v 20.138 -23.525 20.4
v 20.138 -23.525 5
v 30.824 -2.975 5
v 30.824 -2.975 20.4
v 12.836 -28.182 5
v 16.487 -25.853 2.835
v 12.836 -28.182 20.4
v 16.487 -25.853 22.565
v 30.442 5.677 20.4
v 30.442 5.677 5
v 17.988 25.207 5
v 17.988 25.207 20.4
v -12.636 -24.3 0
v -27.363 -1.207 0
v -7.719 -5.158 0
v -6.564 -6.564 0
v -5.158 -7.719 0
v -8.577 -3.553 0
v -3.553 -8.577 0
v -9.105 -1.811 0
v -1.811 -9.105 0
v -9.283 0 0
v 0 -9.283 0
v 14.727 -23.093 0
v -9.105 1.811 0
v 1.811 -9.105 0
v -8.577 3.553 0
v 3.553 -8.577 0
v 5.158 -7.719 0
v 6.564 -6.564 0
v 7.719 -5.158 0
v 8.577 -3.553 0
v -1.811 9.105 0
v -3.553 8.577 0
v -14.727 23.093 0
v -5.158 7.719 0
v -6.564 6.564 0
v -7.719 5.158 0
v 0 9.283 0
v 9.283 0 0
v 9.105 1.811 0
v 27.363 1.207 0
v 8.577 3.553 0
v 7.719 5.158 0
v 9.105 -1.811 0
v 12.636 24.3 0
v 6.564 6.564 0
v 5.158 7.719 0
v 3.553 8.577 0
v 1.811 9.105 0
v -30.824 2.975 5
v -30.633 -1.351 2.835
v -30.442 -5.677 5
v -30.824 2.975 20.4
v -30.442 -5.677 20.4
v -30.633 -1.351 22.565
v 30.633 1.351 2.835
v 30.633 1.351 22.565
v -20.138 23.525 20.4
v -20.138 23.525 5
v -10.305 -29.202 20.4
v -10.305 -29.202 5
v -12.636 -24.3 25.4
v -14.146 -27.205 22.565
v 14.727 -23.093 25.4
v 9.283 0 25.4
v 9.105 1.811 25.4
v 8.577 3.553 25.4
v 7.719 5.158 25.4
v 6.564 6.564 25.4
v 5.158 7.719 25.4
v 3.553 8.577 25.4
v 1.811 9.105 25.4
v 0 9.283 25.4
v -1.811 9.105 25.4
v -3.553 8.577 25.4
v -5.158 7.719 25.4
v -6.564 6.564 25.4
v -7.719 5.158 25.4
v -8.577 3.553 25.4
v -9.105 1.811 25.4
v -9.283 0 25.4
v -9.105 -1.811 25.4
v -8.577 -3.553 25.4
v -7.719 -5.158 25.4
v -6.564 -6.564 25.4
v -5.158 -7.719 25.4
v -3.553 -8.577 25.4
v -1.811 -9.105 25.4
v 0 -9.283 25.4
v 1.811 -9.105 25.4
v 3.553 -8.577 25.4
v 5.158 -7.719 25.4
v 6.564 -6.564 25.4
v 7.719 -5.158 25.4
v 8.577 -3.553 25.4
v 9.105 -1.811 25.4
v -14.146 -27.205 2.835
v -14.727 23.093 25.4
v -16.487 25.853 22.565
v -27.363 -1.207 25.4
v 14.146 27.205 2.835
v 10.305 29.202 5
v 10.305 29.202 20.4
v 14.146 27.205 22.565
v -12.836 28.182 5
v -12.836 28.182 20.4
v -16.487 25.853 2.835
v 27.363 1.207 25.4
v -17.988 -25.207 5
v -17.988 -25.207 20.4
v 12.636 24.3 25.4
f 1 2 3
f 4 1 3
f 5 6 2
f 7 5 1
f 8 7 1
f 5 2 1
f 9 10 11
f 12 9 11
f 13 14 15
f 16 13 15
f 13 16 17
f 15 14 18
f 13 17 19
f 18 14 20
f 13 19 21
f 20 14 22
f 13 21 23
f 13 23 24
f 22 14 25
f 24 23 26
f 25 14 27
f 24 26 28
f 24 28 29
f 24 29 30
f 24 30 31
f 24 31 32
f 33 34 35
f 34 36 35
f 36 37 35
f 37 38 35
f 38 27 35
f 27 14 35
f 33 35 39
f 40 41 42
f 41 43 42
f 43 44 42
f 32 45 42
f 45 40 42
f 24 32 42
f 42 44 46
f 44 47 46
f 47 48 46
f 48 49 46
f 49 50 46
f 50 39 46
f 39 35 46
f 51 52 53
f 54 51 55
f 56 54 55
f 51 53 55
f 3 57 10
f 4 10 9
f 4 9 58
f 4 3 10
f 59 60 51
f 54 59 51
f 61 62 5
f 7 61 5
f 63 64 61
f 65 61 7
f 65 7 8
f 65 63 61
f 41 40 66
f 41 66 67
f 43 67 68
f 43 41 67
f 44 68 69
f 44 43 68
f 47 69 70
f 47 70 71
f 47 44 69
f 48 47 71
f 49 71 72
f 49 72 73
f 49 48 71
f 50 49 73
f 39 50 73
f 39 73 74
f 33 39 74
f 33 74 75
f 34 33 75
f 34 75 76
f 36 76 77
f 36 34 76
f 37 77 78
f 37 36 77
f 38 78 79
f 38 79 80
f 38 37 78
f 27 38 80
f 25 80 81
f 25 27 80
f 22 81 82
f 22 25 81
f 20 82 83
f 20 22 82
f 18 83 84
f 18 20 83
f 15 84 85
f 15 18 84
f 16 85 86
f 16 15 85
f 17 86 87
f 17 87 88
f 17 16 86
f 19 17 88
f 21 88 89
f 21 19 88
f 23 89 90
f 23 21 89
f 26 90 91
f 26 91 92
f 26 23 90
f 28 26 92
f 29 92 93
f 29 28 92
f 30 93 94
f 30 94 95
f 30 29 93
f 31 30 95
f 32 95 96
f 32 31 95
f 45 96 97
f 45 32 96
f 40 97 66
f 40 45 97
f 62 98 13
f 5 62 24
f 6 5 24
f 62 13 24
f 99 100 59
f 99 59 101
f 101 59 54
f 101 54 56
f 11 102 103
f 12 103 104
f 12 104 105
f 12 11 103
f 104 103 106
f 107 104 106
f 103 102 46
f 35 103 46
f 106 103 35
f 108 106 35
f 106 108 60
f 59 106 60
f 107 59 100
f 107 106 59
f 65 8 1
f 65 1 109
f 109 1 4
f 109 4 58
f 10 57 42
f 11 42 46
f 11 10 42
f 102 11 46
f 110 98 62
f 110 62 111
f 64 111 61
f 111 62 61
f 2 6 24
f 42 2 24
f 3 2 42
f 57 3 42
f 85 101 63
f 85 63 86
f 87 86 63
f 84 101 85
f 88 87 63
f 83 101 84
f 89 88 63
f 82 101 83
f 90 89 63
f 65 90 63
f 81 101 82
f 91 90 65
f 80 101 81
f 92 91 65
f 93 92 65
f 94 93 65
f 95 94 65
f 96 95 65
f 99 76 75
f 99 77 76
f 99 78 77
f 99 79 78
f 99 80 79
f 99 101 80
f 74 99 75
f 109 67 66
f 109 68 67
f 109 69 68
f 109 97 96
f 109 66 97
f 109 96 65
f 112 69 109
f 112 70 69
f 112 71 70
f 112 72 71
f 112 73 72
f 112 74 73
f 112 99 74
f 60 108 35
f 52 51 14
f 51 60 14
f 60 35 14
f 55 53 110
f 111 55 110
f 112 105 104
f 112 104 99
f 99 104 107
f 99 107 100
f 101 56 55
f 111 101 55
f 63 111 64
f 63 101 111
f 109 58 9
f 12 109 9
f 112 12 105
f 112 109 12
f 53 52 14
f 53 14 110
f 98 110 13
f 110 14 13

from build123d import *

# Parameters (mm, degrees)
F0_R     = 9.283405223
F1_DEPTH = 25.4
F2_SIZE  = 5
F3_SIZE  = 5


with BuildPart() as f1:
    # F0 (on Top) → F1 (new body)
    with BuildSketch(Plane.XY):
        Polygon((-17.8308878342, 27.9613517337), (-33.1306848427, -1.4613259696), (-15.2997970084, -29.4226777033), (17.8308878342, -27.9613517337), (33.1306848427, 1.4613259696), (15.2997970084, 29.4226777033), align=None)
        Circle(F0_R, mode=Mode.SUBTRACT)
    extrude(amount=F1_DEPTH)

    # F2
    f2_edges = [f1.edges().sort_by_distance(p)[0] for p in [
        (-17.830888, 27.961352, 12.7),
        (15.299797, 29.422678, 12.7),
        (33.130685, 1.461326, 12.7),
        (-33.130685, -1.461326, 12.7),
        (-15.299797, -29.422678, 12.7),
        (17.830888, -27.961352, 12.7),
    ]]
    chamfer(f2_edges, length=F2_SIZE)

    # F3 (call 1 of 12: OpenCascade refuses the feature's edges together)
    f3_edges = [f1.edges().sort_by_distance(p)[0] for p in [
        (24.215241, 15.442002, 0),
    ]]
    chamfer(f3_edges, length=F3_SIZE)

    # F3#2 (call 2 of 12)
    f3_2_edges = [f1.edges().sort_by_distance(p)[0] for p in [
        (-1.265545, 28.692015, 0),
    ]]
    chamfer(f3_2_edges, length=F3_SIZE)

    # F3#3 (call 3 of 12)
    f3_3_edges = [f1.edges().sort_by_distance(p)[0] for p in [
        (24.215241, 15.442002, 25.4),
    ]]
    chamfer(f3_3_edges, length=F3_SIZE)

    # F3#4 (call 4 of 12)
    f3_4_edges = [f1.edges().sort_by_distance(p)[0] for p in [
        (-1.265545, 28.692015, 25.4),
    ]]
    chamfer(f3_4_edges, length=F3_SIZE)

    # F3#5 (call 5 of 12)
    f3_5_edges = [f1.edges().sort_by_distance(p)[0] for p in [
        (-25.480786, 13.250013, 25.4),
    ]]
    chamfer(f3_5_edges, length=F3_SIZE)

    # F3#6 (call 6 of 12)
    f3_6_edges = [f1.edges().sort_by_distance(p)[0] for p in [
        (-25.480786, 13.250013, 0),
    ]]
    chamfer(f3_6_edges, length=F3_SIZE)

    # F3#7 (call 7 of 12)
    f3_7_edges = [f1.edges().sort_by_distance(p)[0] for p in [
        (-24.215241, -15.442002, 25.4),
    ]]
    chamfer(f3_7_edges, length=F3_SIZE)

    # F3#8 (call 8 of 12)
    f3_8_edges = [f1.edges().sort_by_distance(p)[0] for p in [
        (-24.215241, -15.442002, 0),
    ]]
    chamfer(f3_8_edges, length=F3_SIZE)

    # F3#9 (call 9 of 12)
    f3_9_edges = [f1.edges().sort_by_distance(p)[0] for p in [
        (25.480786, -13.250013, 25.4),
    ]]
    chamfer(f3_9_edges, length=F3_SIZE)

    # F3#10 (call 10 of 12)
    f3_10_edges = [f1.edges().sort_by_distance(p)[0] for p in [
        (25.480786, -13.250013, 0),
    ]]
    chamfer(f3_10_edges, length=F3_SIZE)

    # F3#11 (call 11 of 12)
    f3_11_edges = [f1.edges().sort_by_distance(p)[0] for p in [
        (1.265545, -28.692015, 0),
    ]]
    chamfer(f3_11_edges, length=F3_SIZE)

    # F3#12 (call 12 of 12)
    f3_12_edges = [f1.edges().sort_by_distance(p)[0] for p in [
        (1.265545, -28.692015, 25.4),
    ]]
    chamfer(f3_12_edges, length=F3_SIZE)


solid = f1.part
